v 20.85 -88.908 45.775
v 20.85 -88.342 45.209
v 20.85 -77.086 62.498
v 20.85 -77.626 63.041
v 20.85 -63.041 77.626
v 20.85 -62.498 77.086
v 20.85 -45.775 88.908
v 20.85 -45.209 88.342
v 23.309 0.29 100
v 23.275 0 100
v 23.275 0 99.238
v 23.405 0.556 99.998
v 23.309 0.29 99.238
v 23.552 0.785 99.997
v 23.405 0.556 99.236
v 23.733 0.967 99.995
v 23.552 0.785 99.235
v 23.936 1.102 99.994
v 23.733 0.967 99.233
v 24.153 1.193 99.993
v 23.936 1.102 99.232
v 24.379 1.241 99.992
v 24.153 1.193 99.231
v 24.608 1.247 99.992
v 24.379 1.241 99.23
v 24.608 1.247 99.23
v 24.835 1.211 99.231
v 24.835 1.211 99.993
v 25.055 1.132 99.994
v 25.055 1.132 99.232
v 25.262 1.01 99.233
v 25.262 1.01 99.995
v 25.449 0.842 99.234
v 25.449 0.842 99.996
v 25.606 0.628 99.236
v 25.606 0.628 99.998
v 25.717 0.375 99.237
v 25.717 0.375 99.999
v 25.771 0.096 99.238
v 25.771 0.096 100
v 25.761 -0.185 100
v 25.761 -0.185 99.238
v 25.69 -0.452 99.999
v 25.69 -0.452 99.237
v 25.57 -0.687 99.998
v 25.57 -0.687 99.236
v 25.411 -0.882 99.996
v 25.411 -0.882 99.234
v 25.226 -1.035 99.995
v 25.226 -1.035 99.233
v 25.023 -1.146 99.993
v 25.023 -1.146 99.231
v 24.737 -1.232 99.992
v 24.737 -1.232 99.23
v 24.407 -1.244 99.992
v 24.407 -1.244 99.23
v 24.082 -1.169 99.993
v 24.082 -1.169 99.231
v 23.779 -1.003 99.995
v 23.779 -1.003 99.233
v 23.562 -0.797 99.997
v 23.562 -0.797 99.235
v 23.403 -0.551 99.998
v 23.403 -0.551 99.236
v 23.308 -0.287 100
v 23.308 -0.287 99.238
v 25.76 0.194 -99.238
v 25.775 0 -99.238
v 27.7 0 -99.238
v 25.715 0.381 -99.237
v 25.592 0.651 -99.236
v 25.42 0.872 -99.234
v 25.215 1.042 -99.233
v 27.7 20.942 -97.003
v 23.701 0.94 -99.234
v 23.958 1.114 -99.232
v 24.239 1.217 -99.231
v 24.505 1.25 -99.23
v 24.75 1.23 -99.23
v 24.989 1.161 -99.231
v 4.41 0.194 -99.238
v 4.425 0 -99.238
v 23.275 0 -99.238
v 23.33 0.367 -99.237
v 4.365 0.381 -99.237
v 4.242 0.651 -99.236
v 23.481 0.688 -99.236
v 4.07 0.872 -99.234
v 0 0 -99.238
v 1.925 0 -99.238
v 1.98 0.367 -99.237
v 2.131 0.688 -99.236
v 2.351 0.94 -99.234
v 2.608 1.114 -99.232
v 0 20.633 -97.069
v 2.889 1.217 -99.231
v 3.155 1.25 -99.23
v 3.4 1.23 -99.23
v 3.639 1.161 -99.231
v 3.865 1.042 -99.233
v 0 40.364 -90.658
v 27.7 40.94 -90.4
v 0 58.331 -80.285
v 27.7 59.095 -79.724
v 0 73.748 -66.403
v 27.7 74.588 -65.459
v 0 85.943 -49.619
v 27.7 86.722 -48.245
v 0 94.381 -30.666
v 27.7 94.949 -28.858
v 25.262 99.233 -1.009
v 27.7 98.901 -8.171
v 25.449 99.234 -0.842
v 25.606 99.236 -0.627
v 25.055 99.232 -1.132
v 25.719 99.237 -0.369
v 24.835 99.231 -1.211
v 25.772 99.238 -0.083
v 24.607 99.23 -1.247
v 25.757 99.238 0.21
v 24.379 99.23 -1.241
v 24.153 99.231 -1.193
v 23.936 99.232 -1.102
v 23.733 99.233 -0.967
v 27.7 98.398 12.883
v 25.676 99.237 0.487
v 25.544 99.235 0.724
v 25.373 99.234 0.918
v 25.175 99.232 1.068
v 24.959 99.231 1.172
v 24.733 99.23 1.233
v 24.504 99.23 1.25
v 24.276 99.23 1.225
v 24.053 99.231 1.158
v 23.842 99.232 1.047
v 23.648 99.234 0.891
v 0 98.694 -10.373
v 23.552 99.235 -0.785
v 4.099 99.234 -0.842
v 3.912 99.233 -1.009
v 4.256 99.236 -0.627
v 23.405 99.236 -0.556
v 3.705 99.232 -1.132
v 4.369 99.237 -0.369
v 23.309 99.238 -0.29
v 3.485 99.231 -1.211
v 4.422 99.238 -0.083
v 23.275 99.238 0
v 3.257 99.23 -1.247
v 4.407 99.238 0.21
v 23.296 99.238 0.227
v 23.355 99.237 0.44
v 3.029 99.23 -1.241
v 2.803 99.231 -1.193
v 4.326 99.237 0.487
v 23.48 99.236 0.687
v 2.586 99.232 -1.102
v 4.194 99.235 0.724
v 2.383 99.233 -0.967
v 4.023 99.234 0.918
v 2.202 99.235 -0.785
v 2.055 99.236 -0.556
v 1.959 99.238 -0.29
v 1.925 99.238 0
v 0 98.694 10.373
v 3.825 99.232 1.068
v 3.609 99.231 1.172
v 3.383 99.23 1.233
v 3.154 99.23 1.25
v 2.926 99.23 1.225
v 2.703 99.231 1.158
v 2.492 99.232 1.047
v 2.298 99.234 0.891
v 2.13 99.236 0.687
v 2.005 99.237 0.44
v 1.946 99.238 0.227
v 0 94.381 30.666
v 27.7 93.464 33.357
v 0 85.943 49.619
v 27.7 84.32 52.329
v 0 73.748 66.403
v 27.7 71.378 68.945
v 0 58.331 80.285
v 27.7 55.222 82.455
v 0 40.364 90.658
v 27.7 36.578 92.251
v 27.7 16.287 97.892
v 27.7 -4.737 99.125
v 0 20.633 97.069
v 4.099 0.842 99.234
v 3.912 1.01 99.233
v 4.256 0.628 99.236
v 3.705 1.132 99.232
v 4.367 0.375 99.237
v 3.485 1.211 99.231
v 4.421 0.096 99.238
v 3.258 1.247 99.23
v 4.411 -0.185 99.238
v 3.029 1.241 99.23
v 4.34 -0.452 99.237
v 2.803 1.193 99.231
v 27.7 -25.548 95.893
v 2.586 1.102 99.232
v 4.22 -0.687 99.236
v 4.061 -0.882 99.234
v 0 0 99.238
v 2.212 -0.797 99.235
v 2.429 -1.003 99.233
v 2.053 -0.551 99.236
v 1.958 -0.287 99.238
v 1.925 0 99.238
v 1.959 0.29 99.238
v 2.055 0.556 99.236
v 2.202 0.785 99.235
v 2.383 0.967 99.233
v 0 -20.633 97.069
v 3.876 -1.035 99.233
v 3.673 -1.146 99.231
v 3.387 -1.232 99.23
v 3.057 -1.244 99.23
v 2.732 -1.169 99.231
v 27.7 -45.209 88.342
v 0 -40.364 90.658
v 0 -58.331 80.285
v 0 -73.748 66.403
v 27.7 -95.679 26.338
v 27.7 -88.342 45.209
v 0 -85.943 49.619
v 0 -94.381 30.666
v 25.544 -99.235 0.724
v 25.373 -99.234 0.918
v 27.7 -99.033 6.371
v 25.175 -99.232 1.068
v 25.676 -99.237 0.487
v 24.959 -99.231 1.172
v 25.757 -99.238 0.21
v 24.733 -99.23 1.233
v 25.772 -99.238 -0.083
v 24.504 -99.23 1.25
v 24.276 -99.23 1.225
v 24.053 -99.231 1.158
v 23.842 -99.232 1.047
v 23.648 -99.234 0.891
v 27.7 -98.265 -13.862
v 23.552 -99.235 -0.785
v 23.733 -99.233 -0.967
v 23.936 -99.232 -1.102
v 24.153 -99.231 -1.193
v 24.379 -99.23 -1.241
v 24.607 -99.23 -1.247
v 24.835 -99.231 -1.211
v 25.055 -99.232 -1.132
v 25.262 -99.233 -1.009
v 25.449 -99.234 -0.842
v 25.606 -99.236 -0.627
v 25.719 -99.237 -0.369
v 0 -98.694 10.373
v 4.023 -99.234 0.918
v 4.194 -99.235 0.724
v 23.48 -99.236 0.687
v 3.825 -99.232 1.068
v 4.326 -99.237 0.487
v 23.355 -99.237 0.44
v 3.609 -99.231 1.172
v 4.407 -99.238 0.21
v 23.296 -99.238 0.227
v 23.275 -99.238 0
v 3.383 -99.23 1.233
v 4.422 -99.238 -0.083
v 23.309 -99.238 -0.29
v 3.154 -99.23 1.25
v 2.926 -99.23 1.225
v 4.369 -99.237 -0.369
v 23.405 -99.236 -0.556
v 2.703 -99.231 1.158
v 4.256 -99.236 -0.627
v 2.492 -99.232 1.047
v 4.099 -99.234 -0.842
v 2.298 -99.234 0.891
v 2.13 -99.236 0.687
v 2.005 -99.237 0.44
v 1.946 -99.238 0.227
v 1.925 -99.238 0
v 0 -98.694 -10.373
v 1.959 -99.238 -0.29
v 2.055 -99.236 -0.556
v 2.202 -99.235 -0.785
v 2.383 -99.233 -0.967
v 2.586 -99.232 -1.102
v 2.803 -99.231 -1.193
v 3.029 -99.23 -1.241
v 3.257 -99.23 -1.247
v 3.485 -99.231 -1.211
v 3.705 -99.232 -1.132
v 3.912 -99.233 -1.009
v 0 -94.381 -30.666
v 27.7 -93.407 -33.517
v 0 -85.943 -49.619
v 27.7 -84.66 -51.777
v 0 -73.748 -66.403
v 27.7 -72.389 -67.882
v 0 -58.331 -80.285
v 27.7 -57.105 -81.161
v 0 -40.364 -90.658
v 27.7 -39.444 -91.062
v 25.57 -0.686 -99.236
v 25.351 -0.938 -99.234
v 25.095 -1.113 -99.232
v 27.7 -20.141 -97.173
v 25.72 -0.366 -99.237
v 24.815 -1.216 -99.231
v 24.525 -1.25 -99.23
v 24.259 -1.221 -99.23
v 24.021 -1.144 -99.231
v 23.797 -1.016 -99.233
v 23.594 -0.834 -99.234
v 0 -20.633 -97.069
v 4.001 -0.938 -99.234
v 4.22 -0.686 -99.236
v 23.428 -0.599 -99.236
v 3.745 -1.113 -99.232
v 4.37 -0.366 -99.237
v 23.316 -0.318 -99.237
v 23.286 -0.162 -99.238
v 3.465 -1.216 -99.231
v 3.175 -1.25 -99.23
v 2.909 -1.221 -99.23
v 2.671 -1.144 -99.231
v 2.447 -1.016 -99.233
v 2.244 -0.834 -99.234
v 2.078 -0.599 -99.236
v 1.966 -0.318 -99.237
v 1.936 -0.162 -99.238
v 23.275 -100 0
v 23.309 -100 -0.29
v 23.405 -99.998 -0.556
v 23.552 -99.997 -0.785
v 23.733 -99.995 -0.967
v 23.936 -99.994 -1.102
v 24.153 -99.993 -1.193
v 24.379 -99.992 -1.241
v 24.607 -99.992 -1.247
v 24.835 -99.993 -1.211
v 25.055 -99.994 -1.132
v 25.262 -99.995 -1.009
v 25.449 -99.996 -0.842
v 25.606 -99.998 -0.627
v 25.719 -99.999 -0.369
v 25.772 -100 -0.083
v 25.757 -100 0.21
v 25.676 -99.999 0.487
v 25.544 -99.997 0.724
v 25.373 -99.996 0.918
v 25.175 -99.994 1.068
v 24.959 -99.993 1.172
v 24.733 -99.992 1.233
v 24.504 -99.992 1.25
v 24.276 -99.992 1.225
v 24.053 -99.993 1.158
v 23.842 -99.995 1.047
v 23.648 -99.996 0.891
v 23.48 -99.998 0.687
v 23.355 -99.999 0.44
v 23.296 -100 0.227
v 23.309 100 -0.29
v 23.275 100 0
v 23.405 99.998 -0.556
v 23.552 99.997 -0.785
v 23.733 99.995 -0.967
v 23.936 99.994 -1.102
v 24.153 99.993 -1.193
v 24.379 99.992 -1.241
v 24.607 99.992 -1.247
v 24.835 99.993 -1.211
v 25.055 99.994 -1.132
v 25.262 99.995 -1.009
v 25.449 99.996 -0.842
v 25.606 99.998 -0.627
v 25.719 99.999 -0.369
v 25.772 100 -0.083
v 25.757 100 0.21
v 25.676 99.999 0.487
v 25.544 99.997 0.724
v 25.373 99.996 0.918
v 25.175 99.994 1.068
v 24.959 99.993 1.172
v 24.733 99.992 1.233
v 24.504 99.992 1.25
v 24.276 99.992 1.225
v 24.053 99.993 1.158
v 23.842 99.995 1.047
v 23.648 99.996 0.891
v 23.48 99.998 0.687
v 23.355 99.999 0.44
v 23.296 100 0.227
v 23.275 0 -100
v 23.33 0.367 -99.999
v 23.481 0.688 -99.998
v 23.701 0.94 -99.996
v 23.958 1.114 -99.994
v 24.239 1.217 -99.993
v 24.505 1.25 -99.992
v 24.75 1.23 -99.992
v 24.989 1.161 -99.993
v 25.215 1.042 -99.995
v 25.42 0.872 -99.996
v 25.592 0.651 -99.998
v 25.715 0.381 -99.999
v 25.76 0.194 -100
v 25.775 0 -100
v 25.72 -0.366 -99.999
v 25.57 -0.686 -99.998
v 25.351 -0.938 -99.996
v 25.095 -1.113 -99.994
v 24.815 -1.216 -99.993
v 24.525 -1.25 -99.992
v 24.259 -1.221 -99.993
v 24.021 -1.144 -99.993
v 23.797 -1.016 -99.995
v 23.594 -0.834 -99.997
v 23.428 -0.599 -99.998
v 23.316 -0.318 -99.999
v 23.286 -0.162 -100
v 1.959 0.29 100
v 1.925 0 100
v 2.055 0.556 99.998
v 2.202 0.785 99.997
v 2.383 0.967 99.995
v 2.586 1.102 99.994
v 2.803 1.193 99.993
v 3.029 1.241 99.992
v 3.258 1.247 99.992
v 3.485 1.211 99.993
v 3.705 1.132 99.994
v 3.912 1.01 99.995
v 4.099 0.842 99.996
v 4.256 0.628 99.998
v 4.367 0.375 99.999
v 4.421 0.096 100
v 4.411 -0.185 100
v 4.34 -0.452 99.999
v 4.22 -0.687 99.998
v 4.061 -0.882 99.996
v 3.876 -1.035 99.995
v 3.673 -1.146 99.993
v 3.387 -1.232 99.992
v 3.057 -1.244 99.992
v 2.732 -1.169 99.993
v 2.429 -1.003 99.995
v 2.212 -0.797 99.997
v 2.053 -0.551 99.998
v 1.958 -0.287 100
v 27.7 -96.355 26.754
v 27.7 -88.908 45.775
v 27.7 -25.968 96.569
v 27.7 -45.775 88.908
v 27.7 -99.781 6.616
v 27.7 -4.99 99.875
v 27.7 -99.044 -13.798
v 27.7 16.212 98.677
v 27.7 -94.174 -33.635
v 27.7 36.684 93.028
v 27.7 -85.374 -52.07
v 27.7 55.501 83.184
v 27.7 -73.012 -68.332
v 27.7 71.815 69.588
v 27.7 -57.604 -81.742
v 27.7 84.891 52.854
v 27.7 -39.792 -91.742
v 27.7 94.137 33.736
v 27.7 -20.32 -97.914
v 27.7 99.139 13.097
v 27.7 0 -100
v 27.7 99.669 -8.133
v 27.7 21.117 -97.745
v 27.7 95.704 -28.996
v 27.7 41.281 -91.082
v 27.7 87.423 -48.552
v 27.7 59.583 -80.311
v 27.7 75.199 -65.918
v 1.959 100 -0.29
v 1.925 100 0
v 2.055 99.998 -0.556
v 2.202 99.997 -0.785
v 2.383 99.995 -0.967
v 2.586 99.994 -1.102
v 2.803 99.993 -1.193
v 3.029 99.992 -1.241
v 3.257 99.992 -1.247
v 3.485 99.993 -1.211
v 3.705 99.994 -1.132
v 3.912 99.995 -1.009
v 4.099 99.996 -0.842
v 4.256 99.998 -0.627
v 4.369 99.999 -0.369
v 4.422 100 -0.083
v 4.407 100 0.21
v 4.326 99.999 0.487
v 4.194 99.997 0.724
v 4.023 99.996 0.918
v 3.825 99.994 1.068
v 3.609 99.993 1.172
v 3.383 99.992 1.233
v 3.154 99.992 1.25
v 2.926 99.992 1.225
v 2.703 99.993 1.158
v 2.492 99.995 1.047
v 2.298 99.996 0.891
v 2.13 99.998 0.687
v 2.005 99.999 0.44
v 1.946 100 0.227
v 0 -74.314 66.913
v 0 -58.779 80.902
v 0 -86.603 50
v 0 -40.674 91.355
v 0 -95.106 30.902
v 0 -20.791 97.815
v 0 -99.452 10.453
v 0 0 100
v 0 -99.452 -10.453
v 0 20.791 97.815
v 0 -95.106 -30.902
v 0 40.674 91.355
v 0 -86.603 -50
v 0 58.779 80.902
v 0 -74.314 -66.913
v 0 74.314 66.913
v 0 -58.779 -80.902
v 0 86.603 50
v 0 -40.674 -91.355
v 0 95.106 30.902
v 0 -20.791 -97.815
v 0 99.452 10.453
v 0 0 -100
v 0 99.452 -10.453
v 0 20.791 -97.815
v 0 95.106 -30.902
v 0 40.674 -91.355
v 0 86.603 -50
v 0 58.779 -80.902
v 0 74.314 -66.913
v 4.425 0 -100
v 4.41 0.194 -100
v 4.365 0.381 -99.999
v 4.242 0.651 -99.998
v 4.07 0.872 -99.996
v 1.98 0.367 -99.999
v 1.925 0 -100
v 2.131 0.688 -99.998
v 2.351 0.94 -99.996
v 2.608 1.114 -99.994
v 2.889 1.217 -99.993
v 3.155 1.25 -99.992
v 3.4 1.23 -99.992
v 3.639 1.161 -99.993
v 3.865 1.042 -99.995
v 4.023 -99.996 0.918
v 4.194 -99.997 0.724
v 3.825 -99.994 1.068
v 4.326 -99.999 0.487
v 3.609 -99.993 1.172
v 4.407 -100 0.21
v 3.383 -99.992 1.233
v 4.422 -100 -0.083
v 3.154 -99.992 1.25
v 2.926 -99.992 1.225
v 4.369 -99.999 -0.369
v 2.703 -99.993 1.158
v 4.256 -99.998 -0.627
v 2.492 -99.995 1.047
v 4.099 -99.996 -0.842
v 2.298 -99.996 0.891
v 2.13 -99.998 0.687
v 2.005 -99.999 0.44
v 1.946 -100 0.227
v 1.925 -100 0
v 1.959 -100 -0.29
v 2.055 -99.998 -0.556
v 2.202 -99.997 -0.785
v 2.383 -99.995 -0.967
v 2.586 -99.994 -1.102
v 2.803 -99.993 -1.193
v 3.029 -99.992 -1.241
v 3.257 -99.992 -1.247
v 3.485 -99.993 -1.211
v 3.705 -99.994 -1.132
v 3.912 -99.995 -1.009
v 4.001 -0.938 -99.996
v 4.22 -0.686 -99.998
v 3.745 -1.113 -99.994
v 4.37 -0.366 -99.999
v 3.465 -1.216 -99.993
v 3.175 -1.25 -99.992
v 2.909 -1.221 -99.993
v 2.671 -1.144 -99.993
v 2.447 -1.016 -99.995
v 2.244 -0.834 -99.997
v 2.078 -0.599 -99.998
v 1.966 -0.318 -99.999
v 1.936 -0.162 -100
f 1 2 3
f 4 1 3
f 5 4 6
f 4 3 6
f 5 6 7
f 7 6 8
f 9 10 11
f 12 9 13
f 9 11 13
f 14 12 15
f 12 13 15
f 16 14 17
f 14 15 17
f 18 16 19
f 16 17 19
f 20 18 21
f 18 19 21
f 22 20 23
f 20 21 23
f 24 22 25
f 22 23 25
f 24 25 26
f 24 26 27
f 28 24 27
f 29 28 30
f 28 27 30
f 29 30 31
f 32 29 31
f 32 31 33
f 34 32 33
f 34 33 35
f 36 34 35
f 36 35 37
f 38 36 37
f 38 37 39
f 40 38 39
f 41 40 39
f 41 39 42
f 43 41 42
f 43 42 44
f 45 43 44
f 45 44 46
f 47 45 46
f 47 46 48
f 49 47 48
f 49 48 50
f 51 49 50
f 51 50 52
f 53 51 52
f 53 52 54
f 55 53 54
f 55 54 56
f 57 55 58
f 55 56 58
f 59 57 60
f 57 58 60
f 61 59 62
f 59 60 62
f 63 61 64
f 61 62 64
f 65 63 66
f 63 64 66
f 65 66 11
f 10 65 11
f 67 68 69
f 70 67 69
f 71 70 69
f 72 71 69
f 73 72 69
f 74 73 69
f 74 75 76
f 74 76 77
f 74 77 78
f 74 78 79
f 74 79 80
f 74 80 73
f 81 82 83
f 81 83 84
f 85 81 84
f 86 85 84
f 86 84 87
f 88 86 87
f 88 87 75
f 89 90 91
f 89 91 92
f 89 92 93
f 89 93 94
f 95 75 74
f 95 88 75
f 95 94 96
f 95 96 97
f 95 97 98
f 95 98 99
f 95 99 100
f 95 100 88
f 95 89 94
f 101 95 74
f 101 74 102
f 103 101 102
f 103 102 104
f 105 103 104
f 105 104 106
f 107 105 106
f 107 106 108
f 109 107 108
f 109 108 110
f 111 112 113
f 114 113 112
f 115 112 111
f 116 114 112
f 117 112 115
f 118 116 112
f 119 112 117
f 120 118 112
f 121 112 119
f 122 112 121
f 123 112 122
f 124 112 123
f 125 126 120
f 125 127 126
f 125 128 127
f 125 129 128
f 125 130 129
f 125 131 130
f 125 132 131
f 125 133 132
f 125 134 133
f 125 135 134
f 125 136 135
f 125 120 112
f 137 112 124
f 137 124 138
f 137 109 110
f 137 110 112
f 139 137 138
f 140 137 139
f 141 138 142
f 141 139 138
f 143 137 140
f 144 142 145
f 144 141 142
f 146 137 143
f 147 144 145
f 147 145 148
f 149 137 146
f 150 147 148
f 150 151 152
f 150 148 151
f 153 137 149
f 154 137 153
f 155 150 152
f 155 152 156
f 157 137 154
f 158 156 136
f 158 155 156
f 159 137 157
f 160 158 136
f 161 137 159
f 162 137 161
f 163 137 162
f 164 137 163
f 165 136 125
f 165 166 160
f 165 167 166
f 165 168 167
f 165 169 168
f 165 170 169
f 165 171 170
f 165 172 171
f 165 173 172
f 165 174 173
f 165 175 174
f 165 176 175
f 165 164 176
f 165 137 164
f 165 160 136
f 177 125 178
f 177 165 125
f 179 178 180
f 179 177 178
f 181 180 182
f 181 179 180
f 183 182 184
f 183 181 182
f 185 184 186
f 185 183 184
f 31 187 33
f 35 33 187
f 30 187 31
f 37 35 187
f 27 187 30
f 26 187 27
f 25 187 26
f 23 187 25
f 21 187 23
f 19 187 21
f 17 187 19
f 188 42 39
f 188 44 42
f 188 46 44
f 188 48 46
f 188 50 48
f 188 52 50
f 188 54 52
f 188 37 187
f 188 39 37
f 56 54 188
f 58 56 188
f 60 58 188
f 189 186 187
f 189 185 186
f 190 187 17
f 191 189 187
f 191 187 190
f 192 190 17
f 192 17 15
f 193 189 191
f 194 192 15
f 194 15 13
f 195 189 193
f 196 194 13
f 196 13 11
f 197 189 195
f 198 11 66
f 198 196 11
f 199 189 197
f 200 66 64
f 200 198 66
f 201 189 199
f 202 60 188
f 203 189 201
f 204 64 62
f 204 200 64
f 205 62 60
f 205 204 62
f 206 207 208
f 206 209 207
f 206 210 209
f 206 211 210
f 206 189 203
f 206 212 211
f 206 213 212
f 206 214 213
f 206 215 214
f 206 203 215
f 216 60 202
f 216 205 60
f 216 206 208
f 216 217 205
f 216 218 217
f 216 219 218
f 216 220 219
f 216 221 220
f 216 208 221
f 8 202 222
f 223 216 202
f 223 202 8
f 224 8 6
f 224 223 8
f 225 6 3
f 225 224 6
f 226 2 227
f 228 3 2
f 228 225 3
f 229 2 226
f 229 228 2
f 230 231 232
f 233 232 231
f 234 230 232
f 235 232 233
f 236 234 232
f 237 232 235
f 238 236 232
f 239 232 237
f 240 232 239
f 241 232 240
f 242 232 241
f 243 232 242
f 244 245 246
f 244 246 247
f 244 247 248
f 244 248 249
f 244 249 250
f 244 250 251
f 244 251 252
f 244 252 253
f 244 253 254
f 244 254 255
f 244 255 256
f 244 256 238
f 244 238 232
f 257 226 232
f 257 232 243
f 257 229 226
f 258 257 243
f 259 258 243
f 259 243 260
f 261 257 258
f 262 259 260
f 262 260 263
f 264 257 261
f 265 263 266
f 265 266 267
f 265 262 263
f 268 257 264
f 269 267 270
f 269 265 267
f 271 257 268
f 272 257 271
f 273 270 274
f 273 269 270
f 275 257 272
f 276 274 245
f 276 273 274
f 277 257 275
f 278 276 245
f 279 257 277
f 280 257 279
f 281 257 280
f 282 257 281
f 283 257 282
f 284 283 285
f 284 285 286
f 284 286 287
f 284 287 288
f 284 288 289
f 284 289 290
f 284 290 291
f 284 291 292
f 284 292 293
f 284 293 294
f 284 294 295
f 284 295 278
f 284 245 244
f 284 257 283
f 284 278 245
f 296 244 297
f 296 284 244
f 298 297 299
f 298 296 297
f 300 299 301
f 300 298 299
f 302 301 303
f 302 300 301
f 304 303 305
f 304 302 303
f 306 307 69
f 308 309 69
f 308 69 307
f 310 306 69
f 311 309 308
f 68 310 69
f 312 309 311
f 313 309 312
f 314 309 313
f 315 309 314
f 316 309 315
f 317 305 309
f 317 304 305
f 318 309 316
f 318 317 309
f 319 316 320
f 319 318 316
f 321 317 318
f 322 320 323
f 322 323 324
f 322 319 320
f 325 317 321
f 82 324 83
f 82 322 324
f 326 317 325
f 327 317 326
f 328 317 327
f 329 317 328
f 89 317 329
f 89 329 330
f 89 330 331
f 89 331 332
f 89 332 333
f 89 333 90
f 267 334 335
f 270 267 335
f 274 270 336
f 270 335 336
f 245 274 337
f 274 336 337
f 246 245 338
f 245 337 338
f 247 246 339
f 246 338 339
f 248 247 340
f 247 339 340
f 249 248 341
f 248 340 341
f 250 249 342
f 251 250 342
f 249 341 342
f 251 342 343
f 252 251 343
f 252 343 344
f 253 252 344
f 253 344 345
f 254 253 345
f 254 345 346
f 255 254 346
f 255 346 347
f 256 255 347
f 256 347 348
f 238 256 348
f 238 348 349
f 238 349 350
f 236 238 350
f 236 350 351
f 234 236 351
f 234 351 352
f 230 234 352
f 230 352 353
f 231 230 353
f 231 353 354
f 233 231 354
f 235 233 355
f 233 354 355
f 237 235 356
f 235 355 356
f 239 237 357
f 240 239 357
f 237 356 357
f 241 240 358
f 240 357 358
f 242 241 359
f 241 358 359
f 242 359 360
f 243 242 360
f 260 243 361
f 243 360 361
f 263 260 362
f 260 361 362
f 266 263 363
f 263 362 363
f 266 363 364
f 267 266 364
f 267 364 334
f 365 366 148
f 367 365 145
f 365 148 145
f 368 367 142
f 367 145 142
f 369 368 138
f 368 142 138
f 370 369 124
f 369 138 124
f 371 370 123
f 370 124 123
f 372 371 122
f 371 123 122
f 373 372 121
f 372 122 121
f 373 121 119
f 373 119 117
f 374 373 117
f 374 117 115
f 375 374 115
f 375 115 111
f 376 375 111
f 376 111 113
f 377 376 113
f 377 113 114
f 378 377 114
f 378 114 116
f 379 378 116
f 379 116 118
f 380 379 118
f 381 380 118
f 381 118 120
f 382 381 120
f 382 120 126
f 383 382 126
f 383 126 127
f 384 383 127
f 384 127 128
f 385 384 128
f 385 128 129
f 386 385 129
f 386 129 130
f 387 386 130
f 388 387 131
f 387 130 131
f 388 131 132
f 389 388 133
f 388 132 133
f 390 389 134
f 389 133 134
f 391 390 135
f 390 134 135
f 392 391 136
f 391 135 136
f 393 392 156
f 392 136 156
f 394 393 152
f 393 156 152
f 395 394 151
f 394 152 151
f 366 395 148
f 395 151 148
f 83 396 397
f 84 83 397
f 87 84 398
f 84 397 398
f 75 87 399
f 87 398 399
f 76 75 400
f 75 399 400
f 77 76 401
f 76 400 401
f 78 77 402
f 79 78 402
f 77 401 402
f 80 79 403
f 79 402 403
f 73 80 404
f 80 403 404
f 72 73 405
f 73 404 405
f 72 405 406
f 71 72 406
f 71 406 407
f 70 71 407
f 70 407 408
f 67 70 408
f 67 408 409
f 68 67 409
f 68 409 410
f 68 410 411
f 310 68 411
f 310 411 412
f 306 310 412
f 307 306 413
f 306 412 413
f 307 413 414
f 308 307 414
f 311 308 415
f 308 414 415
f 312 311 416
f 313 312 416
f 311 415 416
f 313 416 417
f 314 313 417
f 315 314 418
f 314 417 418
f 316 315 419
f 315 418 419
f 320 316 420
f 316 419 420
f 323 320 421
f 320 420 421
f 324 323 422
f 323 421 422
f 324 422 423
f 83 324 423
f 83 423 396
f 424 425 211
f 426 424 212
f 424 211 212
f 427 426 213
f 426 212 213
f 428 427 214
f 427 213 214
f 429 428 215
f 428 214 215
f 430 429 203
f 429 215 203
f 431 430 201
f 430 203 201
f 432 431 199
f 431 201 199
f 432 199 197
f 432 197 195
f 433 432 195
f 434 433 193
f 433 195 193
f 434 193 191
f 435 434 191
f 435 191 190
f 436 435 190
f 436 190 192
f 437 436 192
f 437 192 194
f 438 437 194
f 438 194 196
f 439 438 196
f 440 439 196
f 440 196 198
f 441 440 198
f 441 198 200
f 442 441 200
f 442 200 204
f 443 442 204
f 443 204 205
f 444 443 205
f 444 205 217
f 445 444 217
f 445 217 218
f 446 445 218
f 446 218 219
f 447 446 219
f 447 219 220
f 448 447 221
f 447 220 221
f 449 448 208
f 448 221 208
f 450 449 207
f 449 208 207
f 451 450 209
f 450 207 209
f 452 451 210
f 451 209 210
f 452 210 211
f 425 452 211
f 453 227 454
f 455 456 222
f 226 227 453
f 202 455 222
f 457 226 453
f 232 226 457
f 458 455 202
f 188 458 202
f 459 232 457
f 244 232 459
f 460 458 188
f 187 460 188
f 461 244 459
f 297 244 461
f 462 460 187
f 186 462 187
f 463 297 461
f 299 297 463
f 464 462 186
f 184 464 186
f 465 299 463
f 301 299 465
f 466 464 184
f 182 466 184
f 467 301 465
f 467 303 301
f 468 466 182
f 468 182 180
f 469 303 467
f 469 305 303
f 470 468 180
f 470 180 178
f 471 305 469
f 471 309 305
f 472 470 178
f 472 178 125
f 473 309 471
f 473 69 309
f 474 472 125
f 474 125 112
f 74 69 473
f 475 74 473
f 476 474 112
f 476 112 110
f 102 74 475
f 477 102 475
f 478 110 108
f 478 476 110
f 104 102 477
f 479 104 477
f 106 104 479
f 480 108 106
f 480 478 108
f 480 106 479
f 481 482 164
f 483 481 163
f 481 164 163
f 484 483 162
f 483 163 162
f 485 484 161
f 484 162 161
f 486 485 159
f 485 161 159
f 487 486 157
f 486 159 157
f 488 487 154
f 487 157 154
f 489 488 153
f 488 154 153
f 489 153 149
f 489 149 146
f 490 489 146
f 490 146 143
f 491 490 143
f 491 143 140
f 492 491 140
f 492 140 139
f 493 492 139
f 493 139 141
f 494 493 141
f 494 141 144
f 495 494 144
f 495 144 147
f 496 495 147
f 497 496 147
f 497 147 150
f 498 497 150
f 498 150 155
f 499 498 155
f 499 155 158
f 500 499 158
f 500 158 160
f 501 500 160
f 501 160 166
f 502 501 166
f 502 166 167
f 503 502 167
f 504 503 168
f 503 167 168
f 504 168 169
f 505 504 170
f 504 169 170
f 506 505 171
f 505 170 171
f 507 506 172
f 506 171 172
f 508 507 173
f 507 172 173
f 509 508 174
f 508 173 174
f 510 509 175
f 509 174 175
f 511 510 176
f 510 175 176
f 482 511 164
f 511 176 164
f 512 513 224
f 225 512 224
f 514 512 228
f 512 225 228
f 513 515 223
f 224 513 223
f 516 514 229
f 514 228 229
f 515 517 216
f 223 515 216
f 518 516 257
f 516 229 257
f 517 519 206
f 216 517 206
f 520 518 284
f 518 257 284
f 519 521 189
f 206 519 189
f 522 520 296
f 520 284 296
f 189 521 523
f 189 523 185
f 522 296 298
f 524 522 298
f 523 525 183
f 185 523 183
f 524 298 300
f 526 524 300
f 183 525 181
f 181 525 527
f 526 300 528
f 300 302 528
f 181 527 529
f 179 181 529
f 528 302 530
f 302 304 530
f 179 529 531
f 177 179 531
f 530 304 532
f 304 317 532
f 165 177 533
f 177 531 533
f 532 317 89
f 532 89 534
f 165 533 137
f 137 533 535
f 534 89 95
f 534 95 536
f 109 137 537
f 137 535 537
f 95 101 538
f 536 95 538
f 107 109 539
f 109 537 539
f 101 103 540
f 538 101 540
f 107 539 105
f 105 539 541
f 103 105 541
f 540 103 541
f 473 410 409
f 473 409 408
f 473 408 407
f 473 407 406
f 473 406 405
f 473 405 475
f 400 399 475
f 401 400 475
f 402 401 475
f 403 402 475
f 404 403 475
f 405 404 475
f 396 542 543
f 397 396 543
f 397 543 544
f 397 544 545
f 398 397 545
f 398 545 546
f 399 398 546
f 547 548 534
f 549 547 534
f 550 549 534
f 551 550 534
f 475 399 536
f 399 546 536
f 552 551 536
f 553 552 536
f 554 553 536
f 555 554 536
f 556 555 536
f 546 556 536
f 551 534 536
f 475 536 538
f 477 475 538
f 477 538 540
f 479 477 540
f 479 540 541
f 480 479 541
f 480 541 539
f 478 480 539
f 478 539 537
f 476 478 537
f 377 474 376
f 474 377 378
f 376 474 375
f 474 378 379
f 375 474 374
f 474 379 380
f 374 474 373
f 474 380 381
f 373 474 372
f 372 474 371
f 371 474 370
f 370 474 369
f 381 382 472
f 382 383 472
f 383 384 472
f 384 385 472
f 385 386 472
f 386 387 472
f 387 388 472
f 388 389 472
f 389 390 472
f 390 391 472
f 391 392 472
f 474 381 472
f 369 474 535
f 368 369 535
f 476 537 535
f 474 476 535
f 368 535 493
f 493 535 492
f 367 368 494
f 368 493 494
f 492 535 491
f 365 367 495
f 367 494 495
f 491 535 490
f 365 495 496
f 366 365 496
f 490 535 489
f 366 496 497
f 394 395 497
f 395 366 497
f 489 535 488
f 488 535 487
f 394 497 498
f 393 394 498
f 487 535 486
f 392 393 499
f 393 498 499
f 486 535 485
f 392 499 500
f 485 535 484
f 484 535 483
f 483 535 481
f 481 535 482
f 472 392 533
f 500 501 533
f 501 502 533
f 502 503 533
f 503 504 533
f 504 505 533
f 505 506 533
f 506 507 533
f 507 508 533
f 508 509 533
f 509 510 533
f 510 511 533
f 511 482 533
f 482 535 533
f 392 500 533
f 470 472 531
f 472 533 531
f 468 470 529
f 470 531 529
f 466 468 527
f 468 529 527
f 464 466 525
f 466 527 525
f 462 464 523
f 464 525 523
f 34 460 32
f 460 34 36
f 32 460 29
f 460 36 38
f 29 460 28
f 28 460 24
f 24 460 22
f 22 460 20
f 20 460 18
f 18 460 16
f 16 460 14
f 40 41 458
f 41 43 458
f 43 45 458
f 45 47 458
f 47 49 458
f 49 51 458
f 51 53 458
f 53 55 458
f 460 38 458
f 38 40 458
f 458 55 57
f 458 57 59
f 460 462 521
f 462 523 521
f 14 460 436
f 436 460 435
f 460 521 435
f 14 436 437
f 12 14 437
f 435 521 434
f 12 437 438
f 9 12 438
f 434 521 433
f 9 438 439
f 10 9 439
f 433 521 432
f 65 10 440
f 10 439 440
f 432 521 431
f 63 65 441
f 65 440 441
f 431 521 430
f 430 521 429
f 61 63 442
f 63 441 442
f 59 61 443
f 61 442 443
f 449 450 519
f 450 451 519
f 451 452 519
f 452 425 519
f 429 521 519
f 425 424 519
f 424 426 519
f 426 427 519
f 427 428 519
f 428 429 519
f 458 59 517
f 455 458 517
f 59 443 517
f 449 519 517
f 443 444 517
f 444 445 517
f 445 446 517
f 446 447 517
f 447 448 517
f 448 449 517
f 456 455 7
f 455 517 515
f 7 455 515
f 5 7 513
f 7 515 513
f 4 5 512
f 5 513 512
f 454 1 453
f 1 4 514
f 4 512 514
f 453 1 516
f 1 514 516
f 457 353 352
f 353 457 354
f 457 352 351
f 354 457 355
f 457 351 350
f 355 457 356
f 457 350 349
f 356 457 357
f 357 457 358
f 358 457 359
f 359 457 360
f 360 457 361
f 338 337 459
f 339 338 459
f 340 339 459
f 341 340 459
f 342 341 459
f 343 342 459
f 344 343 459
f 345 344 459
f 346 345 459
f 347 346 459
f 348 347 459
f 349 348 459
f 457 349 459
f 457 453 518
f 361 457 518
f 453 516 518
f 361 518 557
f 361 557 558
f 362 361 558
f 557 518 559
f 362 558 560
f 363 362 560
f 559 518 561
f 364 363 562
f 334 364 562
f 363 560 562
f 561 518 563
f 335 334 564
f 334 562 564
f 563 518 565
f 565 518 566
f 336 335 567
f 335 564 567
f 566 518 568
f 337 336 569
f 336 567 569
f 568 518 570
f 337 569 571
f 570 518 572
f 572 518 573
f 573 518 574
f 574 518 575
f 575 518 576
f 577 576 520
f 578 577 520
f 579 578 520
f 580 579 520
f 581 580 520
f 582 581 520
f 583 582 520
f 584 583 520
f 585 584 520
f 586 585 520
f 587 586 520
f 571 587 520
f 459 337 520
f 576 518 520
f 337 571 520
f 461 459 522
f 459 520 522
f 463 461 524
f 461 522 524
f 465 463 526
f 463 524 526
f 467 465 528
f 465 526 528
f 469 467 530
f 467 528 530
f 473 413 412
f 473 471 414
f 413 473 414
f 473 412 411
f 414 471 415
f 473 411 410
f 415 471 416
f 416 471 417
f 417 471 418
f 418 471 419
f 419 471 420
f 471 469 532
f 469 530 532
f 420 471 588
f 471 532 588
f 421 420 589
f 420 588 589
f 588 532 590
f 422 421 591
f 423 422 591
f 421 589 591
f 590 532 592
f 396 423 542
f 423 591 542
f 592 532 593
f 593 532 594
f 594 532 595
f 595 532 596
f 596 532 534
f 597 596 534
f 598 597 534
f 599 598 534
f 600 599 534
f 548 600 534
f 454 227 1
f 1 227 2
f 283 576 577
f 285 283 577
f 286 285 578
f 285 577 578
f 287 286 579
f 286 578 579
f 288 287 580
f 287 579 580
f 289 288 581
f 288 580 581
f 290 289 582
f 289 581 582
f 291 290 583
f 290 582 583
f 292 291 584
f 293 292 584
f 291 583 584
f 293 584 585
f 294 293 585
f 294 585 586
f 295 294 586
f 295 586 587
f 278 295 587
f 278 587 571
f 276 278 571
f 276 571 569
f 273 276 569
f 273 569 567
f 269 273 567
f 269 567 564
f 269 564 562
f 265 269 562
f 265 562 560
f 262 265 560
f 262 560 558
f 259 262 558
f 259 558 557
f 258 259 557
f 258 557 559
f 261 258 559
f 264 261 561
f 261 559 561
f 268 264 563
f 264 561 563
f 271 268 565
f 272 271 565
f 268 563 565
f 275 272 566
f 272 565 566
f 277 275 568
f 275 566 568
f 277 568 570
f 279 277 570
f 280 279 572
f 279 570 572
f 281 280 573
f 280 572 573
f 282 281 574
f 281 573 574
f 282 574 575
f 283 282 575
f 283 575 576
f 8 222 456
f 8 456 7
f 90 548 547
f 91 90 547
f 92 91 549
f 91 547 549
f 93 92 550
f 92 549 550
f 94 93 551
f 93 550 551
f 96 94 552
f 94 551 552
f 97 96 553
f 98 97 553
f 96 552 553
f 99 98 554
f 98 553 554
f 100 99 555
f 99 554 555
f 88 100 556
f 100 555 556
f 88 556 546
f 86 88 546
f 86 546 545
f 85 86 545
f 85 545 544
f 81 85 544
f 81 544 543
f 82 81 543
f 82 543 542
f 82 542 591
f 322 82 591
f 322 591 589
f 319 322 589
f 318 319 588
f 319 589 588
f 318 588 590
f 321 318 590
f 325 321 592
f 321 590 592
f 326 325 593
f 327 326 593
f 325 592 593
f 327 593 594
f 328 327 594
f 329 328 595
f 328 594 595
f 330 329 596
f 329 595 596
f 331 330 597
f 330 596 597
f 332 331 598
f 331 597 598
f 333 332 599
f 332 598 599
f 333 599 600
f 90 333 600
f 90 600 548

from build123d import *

# Parameters (mm, degrees)
SKETCH1_R             = 100
SKETCH1_R_2           = 99.238
BOSS_EXTRUDE1_DEPTH   = 27.7
F_2_5MM_DOWEL_HOLE1_D = 2.5
F_2_5MM_DOWEL_HOLE2_D = 2.5
SKETCH6_W             = 7.35
SKETCH6_H             = 61
CUT_EXTRUDE1_DEPTH    = 145.108605038


with BuildPart() as part:
    # Sketch1 → Boss-Extrude1 (new body)
    with BuildSketch(Plane(origin=(0, 0, 0), x_dir=(0, 0, -1), z_dir=(1, 0, 0))):
        Circle(SKETCH1_R)
        Circle(SKETCH1_R_2, mode=Mode.SUBTRACT)
    extrude(amount=BOSS_EXTRUDE1_DEPTH)

    # Ø2.5mm Dowel Hole1 (through all)
    with Locations(Plane.XY.offset(100)):
        with Locations((24.525, 0), (3.175, 0)):
            Hole(F_2_5MM_DOWEL_HOLE1_D / 2)

    # Ø2.5mm Dowel Hole2 (through all)
    with Locations(Plane(origin=(0, 100, 0), x_dir=(1, 0, 0), z_dir=(0, 1, 0))):
        with Locations((24.525, 0), (3.175, 0)):
            Hole(F_2_5MM_DOWEL_HOLE2_D / 2)

    # Sketch6 → Cut-Extrude1 (cut, through all)
    with BuildSketch(Plane(origin=(0, 0, 0), x_dir=(-1, 0, 0), z_dir=(0, 0.7071067811865475, -0.7071067811865477))):
        with Locations((-24.525, 0)):
            Rectangle(SKETCH6_W, SKETCH6_H)
    extrude(amount=-CUT_EXTRUDE1_DEPTH, mode=Mode.SUBTRACT)


solid = part.part
